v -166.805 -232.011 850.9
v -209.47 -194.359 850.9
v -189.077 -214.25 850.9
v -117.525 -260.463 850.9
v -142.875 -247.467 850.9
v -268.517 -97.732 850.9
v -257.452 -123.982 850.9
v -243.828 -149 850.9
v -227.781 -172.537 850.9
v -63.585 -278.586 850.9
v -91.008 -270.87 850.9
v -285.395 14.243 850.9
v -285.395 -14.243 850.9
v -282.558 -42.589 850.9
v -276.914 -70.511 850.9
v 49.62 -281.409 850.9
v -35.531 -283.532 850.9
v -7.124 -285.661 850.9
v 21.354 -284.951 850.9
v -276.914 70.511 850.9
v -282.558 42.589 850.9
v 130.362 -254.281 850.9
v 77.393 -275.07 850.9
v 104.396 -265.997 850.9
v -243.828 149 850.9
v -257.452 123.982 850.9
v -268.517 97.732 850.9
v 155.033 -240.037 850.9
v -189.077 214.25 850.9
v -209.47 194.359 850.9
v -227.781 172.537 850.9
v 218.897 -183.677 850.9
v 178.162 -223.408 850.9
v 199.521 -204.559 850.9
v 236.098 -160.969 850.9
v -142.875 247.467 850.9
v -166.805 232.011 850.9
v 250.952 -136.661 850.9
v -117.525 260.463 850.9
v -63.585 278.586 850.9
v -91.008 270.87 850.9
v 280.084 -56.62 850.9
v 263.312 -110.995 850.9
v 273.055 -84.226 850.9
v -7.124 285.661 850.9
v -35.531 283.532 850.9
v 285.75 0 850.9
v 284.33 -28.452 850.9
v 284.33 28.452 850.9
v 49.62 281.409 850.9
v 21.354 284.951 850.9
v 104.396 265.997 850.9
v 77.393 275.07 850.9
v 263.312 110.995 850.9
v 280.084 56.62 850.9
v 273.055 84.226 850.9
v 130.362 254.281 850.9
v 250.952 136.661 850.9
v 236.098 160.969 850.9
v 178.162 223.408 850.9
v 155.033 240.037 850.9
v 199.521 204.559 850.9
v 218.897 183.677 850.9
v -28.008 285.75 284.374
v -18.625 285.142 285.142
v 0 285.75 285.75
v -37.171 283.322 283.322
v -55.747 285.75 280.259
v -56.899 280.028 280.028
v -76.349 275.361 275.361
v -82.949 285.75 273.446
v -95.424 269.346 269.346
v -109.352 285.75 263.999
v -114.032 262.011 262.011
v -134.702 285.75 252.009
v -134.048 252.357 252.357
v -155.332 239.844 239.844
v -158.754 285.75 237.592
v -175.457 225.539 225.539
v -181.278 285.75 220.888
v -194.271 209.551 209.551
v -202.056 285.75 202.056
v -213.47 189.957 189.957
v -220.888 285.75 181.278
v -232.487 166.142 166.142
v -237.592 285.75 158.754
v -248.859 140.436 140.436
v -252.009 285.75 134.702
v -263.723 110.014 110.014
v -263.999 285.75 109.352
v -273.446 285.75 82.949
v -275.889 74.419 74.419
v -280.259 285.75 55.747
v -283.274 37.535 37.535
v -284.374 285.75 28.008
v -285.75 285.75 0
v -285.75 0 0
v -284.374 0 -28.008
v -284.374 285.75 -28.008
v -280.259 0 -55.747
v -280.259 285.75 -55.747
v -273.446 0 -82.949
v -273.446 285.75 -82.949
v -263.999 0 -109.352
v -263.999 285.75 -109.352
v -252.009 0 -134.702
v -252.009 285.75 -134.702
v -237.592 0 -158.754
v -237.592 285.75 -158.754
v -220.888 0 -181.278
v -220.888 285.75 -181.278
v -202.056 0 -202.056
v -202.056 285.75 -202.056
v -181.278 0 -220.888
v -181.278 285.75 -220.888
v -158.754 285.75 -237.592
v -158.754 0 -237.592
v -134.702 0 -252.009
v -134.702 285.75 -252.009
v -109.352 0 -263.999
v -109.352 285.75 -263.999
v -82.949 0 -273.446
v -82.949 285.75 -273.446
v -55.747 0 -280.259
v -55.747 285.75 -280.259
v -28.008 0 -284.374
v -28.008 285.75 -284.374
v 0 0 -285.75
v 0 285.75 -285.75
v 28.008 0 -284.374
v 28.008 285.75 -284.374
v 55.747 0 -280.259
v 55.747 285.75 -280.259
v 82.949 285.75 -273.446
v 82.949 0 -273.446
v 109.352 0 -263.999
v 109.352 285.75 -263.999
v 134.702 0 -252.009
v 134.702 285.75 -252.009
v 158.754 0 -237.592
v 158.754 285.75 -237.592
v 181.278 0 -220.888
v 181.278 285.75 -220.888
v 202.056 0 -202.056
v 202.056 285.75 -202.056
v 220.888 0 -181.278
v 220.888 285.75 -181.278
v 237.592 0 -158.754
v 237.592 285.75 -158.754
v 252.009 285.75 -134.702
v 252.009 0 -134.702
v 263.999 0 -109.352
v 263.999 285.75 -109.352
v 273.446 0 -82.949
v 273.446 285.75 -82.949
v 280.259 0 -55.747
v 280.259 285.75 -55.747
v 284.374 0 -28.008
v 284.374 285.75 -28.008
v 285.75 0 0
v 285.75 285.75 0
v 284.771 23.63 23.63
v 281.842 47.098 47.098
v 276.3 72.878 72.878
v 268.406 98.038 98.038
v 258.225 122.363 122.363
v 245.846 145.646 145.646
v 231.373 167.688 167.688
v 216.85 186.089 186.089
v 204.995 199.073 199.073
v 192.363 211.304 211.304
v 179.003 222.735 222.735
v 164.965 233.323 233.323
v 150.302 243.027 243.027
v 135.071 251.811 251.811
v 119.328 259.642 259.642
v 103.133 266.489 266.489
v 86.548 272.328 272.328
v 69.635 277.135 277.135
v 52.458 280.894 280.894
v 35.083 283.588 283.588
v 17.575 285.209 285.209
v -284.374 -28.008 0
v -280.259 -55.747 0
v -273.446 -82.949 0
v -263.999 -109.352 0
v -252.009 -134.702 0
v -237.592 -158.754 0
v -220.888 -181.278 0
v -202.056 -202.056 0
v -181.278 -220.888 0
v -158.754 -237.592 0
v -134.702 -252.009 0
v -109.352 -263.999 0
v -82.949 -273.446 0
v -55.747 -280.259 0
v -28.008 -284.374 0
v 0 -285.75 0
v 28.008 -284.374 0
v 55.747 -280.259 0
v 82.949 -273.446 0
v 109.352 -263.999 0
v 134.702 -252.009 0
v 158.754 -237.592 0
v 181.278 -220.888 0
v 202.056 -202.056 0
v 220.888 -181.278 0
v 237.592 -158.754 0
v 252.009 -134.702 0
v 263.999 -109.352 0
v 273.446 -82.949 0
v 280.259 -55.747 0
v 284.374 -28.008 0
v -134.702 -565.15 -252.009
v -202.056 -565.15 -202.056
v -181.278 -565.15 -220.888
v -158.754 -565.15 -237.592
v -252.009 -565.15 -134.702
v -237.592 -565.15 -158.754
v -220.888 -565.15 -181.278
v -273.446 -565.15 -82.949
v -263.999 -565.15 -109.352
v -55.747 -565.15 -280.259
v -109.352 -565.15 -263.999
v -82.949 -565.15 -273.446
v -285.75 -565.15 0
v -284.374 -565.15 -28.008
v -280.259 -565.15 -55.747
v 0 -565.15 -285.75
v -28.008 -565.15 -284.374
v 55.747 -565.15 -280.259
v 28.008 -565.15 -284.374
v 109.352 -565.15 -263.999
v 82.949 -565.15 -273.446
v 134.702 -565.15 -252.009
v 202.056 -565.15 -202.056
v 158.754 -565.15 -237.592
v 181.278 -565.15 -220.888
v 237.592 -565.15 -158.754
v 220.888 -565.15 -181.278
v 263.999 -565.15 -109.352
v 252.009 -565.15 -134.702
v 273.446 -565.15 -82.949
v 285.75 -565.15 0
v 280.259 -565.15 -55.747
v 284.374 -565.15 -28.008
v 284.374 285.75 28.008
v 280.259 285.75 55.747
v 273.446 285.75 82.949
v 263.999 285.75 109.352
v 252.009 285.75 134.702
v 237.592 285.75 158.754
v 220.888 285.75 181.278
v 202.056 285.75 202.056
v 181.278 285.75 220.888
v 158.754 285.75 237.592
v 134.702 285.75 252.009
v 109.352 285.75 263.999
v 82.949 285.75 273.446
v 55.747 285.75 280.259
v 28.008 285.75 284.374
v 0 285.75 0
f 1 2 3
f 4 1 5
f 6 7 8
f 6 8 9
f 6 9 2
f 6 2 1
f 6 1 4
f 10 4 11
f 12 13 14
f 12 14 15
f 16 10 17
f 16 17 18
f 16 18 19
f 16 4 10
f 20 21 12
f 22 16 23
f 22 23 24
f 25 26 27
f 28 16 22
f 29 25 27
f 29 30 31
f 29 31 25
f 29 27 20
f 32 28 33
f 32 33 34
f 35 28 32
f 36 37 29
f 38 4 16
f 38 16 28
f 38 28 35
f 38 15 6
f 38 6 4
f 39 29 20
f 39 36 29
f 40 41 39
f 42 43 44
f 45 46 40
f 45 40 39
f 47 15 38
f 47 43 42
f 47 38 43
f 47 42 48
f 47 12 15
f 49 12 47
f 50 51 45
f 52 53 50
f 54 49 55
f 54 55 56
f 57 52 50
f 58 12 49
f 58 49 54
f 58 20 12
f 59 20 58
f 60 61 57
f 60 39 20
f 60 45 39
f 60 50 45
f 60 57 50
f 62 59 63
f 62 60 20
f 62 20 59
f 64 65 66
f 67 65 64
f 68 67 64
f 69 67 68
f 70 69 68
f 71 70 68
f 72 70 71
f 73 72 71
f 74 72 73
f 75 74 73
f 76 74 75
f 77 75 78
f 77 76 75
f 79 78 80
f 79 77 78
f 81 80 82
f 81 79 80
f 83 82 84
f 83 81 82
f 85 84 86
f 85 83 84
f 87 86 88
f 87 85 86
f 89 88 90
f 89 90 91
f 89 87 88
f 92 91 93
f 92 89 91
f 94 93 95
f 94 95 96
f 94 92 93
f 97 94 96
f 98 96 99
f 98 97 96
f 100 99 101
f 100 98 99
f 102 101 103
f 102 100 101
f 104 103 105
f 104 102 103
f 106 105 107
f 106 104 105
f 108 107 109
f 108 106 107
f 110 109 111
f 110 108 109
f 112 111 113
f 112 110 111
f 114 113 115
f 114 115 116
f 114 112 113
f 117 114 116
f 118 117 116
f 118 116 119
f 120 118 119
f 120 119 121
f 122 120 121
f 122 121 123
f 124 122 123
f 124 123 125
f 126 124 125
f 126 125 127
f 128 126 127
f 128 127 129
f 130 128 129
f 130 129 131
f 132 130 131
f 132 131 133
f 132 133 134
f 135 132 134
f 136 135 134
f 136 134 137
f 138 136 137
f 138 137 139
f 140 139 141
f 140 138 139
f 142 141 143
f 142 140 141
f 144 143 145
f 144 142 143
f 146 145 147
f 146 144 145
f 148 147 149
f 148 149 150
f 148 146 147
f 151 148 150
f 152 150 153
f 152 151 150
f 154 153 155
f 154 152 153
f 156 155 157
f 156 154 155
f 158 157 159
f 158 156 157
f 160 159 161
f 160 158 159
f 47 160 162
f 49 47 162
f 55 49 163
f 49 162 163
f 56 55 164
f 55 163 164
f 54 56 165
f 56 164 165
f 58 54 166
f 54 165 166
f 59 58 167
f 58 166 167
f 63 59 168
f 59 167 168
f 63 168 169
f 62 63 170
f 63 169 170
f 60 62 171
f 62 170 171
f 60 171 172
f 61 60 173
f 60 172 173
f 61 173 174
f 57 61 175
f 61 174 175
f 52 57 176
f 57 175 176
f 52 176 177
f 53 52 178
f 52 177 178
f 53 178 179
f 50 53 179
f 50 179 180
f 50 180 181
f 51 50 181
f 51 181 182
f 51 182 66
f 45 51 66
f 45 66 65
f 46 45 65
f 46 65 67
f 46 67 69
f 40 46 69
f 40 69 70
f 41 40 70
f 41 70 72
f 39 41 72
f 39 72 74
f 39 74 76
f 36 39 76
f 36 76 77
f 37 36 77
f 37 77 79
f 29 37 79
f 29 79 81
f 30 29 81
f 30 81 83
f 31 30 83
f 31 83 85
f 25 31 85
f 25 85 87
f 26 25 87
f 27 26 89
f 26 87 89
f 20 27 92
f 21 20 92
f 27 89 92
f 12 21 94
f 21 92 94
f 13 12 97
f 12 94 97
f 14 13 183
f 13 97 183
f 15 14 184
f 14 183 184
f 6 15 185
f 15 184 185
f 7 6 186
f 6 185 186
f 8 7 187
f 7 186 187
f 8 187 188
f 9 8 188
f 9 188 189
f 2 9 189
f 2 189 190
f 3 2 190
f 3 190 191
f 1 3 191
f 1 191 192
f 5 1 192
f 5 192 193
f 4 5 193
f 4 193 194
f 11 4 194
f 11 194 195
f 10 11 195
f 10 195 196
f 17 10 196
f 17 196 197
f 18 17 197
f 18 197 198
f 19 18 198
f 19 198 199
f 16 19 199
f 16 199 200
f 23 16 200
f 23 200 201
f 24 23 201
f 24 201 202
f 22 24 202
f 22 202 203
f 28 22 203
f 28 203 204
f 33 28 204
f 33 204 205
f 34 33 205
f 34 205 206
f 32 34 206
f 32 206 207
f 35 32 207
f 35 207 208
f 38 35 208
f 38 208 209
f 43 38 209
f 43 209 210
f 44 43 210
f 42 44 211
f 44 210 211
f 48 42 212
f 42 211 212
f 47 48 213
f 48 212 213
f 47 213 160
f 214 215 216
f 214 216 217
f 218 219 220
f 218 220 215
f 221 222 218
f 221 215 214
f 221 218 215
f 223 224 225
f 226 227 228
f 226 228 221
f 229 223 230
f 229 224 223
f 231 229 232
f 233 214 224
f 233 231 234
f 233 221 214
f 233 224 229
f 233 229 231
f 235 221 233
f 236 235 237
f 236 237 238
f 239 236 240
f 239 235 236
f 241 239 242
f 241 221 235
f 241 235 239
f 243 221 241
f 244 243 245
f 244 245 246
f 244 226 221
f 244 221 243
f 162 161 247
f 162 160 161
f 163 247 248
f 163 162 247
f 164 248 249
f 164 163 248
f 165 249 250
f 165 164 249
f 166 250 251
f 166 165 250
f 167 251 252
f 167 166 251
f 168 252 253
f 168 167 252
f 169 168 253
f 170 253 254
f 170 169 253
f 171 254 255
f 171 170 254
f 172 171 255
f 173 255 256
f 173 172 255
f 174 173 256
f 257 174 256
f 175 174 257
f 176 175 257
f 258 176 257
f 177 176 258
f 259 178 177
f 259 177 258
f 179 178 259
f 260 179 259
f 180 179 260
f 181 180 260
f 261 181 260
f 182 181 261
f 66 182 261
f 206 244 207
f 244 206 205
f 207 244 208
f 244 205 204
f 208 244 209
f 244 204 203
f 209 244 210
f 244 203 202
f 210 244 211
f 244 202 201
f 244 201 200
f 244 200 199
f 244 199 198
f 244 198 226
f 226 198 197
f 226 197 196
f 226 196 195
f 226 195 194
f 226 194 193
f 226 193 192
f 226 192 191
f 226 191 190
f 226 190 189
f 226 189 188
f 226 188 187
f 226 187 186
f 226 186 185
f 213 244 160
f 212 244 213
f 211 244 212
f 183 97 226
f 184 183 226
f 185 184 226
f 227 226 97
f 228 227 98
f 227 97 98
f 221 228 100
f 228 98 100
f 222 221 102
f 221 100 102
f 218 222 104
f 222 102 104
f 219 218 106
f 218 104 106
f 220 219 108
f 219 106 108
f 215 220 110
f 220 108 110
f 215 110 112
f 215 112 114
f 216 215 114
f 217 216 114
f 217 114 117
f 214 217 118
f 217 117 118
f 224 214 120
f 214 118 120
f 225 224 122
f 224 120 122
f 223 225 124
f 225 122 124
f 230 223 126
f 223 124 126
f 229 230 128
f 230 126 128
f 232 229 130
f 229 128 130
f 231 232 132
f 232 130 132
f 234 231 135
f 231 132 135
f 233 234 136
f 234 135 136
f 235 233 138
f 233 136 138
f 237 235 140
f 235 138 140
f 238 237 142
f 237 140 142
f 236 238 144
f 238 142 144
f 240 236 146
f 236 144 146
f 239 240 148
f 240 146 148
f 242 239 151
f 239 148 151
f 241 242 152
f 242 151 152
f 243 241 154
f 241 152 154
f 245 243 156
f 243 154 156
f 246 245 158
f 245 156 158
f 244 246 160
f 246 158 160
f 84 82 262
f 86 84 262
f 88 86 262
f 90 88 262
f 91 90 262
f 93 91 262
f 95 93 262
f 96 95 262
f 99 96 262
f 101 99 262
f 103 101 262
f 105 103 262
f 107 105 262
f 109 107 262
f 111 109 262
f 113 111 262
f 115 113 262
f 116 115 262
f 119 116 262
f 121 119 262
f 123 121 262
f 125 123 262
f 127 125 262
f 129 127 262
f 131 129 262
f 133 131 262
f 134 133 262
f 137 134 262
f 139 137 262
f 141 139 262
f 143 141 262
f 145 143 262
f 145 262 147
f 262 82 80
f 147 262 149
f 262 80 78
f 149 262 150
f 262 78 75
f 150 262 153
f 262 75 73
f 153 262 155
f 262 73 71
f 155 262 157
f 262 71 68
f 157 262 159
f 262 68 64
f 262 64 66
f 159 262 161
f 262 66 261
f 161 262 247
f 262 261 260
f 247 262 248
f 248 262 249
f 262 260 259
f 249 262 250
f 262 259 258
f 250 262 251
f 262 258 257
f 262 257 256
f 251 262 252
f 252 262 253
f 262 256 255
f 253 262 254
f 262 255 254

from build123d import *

# Parameters (mm, degrees)
F0_R     = 285.75
F1_DEPTH = 850.9
F2_R     = 285.75
F3_DEPTH = 285.75
F4_DEPTH = 565.15


with BuildPart() as f1:
    # F0 (on Top) → F1 (new body)
    with BuildSketch(Plane.XY):
        Circle(F0_R)
    extrude(amount=F1_DEPTH)

    # F2 (on Front) → F3 (join)
    with BuildSketch(Plane.XZ):
        Circle(F2_R)
    extrude(amount=-F3_DEPTH)

    # F3_face (on face) → F4 (join)
    with BuildSketch(Plane(origin=(0, 0, -121.276067), x_dir=(1, 0, 0), z_dir=(0, -1, 0))):
        with BuildLine():
            ThreePointArc((-285.75, 121.276067), (0, -164.473933), (285.75, 121.276067))
            Line((285.75, 121.276067), (-285.75, 121.276067))
        make_face()
    extrude(amount=F4_DEPTH)


solid = f1.part
